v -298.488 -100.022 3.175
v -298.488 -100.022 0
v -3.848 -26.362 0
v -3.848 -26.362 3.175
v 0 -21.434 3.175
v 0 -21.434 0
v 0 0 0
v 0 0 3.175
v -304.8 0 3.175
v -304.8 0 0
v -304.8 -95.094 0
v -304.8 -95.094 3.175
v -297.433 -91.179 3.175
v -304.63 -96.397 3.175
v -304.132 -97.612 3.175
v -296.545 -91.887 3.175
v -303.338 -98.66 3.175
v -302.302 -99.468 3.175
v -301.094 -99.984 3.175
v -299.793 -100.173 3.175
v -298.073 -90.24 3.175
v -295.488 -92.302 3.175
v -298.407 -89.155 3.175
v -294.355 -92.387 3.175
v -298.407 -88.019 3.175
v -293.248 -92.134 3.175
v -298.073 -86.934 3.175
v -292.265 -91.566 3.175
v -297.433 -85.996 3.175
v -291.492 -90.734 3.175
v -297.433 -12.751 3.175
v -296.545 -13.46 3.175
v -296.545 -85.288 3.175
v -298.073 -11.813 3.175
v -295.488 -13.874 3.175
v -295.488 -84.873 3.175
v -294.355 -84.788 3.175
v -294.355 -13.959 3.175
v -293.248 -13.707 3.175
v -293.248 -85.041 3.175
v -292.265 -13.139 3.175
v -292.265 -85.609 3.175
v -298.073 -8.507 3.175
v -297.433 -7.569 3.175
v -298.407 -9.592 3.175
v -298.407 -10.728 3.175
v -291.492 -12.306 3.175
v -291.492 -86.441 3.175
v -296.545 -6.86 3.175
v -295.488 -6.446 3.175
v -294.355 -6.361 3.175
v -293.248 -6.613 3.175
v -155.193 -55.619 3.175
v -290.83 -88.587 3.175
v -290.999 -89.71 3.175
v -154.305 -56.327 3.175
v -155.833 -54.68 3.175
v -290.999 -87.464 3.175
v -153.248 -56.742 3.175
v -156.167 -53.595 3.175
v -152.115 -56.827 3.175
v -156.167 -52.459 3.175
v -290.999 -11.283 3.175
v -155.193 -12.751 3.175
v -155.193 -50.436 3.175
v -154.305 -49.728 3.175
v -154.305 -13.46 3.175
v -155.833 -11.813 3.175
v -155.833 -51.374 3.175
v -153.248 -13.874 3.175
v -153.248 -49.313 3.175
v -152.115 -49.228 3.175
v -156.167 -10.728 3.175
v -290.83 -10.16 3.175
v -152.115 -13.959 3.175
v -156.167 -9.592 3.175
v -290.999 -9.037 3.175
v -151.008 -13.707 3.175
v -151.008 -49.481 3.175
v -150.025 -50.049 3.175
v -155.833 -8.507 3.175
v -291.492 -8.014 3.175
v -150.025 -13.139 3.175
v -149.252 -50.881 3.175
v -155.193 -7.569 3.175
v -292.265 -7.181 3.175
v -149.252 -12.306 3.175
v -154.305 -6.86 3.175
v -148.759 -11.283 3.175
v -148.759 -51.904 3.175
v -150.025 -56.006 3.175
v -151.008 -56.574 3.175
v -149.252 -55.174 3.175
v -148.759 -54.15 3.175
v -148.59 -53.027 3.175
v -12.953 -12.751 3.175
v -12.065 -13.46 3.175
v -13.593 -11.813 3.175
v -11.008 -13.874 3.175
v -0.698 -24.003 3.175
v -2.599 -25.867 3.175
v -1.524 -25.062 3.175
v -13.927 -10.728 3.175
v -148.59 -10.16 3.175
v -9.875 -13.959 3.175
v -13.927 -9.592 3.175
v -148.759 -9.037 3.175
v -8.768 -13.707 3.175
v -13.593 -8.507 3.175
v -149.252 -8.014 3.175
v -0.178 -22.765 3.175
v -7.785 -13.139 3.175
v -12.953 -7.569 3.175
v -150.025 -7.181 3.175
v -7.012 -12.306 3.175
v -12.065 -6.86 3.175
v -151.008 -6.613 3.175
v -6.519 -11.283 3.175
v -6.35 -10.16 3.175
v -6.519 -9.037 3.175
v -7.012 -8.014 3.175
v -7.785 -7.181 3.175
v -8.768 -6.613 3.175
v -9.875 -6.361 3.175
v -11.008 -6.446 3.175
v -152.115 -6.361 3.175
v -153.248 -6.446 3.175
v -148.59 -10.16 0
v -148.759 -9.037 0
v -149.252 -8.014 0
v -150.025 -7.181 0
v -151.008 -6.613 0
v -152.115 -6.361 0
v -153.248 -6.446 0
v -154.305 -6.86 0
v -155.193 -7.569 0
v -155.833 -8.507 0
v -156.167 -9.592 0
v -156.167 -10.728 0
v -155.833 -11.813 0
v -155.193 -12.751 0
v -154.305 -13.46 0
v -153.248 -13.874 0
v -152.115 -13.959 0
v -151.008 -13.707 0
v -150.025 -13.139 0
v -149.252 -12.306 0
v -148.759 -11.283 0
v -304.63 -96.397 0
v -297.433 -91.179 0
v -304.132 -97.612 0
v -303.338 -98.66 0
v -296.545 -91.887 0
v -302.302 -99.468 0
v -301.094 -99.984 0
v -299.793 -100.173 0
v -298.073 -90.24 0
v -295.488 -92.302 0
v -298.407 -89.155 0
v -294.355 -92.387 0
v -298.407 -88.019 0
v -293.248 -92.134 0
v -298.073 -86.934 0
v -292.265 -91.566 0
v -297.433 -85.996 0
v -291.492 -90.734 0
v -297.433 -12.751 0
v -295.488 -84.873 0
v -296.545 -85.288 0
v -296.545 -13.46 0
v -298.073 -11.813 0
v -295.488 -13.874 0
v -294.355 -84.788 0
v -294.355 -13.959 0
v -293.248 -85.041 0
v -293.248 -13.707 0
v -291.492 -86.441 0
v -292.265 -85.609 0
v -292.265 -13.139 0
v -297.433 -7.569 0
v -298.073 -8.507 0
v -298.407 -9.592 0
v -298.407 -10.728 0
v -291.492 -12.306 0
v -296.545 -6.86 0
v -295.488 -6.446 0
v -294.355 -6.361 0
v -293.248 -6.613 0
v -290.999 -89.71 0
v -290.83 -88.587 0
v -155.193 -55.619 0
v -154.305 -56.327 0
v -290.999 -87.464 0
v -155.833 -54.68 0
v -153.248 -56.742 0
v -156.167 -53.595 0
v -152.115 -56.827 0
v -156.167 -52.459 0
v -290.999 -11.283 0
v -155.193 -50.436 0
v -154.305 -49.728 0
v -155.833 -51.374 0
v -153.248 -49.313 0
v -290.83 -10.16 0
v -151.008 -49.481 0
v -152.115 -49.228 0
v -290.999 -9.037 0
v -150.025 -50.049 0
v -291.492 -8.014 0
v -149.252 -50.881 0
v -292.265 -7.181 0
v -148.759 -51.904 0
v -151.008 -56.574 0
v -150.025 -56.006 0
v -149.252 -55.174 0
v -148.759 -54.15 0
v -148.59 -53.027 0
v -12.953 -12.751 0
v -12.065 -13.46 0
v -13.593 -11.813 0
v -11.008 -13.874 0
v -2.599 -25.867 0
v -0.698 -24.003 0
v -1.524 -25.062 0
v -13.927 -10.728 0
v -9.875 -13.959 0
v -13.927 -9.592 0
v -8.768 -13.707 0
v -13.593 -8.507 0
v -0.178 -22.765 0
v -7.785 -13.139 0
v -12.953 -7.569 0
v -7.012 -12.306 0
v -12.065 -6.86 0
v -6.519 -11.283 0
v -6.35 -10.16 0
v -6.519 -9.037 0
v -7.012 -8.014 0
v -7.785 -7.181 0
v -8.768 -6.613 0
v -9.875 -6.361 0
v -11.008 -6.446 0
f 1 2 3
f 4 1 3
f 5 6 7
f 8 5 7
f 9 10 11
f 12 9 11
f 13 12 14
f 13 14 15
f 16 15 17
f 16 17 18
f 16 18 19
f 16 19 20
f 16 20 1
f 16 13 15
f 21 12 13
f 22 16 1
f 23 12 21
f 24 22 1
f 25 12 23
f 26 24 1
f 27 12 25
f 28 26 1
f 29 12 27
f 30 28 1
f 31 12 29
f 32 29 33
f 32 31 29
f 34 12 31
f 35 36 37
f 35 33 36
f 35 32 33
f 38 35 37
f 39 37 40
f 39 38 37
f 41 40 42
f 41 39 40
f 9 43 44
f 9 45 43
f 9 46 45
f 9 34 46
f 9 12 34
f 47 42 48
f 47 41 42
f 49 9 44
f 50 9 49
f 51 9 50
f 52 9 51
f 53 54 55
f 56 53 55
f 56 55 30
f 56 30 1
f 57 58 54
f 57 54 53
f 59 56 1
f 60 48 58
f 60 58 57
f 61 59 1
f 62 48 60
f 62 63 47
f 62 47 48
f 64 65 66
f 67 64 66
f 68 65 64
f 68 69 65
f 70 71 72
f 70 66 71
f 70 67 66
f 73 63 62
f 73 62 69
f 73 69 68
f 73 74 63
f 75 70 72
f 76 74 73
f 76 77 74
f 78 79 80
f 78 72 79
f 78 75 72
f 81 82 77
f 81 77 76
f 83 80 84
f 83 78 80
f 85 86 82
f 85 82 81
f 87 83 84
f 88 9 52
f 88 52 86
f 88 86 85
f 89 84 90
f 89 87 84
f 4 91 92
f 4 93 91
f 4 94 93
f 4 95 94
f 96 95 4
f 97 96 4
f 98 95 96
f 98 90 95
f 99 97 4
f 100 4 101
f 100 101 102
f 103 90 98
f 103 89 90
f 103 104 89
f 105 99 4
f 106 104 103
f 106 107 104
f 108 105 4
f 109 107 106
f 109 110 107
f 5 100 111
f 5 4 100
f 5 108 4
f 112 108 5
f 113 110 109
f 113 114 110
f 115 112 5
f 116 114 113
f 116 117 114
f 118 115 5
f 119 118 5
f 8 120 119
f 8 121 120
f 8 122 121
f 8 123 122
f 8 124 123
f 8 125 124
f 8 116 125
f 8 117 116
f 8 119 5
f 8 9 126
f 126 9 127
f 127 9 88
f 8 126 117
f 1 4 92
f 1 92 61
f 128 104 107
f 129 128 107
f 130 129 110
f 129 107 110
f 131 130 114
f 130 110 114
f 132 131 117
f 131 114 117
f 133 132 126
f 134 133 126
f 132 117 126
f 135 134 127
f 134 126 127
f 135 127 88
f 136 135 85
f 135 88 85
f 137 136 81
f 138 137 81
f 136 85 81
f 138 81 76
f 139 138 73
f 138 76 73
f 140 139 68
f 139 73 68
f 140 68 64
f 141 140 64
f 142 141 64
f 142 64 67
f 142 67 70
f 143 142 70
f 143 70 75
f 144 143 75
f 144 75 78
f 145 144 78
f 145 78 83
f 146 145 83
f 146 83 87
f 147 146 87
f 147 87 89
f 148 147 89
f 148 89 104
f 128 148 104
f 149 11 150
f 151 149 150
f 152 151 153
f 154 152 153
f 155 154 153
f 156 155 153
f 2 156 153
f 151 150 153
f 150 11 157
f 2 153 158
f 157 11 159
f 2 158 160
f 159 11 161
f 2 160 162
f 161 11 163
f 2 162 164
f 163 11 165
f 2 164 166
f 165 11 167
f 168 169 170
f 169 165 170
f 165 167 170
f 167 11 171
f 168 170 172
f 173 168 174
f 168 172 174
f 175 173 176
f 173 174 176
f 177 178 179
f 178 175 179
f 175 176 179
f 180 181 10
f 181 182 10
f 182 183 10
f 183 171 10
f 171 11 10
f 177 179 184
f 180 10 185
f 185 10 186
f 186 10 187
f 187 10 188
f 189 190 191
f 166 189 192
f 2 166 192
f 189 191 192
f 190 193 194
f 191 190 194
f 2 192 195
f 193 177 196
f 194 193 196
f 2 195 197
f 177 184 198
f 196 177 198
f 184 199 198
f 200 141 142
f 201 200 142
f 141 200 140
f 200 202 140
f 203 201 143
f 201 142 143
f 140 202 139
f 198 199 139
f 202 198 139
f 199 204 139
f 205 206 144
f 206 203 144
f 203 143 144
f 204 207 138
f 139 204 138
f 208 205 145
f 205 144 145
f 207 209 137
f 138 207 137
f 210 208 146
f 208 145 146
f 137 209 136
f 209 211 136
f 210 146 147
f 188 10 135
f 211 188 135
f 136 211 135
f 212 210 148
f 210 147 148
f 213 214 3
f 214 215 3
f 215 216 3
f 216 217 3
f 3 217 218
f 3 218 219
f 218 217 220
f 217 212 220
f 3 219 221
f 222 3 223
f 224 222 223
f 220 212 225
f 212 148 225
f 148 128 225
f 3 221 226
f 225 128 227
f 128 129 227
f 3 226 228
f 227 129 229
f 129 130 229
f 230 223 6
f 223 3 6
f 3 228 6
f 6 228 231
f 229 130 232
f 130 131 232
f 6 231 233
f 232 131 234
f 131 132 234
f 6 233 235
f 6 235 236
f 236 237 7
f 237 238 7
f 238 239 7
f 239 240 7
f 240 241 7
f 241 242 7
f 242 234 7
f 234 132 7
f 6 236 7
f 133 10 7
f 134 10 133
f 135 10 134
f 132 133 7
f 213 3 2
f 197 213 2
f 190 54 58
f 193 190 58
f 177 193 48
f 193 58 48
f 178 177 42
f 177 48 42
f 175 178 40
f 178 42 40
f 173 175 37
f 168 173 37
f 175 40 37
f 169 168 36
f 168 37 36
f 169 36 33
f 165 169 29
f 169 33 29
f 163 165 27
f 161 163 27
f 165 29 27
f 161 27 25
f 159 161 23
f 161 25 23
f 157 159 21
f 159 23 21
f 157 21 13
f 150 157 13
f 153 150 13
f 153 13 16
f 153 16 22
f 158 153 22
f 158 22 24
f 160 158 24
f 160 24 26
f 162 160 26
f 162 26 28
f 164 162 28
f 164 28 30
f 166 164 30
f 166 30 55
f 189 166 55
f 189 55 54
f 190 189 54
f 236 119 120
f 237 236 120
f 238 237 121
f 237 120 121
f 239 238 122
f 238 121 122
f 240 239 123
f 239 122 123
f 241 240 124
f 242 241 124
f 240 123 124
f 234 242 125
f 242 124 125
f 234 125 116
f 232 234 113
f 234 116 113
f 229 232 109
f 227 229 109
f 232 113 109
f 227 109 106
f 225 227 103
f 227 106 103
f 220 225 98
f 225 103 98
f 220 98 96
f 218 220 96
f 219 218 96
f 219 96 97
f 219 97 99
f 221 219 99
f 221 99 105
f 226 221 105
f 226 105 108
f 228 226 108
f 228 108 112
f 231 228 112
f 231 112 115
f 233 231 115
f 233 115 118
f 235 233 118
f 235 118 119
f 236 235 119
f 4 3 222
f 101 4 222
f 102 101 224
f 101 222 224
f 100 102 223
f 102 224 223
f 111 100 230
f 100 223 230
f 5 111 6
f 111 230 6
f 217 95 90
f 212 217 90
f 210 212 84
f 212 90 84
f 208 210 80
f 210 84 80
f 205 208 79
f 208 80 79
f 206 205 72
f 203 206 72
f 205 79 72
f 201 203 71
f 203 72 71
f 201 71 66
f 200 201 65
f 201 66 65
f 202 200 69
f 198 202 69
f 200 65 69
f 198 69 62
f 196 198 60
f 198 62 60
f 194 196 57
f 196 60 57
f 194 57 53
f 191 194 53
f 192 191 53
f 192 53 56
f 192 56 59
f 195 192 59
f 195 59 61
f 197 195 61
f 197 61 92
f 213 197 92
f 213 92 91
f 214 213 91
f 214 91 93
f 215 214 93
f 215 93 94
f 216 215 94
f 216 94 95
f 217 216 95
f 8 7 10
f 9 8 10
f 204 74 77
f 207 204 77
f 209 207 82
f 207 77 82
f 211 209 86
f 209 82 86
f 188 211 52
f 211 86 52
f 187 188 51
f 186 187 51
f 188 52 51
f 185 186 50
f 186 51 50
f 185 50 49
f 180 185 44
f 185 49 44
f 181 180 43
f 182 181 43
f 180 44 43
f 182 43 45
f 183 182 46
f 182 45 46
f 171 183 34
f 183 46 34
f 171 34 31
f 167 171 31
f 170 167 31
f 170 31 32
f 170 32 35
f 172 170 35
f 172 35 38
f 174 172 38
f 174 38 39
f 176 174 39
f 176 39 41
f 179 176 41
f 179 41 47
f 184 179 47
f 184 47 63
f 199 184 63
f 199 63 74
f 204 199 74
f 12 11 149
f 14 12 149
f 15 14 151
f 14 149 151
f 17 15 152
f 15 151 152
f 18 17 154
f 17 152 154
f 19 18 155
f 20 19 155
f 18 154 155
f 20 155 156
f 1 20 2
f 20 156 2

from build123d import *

# Parameters (mm, degrees)
F1_DEPTH = 3.175
F2_R     = 3.81
F3_DEPTH = 25.4


with BuildPart() as f1:
    # F0 (on Top) → F1 (new body)
    with BuildSketch(Plane.XY):
        with BuildLine():
            Line((0, -21.433656), (0, 0))
            Line((0, 0), (-304.8, 0))
            Line((-304.8, 0), (-304.8, -95.093656))
            ThreePointArc((-304.8, -95.093656), (-302.846294, -99.097739), (-298.487919, -100.02198))
            Line((-298.487919, -100.02198), (-3.847919, -26.36198))
            ThreePointArc((-3.847919, -26.36198), (-1.075916, -24.55995), (0, -21.433656))
        make_face()
    extrude(amount=F1_DEPTH)

    # F2 (on face) → F3 (cut)
    with BuildSketch(Plane.XY.offset(3.175)):
        with Locations((-294.64, -10.16)):
            Circle(F2_R)
        with Locations((-152.4, -10.16)):
            Circle(F2_R)
        with Locations((-152.4, -53.027312)):
            Circle(F2_R)
        with Locations((-294.64, -88.587312)):
            Circle(F2_R)
        with Locations((-10.16, -10.16)):
            Circle(F2_R)
    extrude(amount=-F3_DEPTH, mode=Mode.SUBTRACT)


solid = f1.part
